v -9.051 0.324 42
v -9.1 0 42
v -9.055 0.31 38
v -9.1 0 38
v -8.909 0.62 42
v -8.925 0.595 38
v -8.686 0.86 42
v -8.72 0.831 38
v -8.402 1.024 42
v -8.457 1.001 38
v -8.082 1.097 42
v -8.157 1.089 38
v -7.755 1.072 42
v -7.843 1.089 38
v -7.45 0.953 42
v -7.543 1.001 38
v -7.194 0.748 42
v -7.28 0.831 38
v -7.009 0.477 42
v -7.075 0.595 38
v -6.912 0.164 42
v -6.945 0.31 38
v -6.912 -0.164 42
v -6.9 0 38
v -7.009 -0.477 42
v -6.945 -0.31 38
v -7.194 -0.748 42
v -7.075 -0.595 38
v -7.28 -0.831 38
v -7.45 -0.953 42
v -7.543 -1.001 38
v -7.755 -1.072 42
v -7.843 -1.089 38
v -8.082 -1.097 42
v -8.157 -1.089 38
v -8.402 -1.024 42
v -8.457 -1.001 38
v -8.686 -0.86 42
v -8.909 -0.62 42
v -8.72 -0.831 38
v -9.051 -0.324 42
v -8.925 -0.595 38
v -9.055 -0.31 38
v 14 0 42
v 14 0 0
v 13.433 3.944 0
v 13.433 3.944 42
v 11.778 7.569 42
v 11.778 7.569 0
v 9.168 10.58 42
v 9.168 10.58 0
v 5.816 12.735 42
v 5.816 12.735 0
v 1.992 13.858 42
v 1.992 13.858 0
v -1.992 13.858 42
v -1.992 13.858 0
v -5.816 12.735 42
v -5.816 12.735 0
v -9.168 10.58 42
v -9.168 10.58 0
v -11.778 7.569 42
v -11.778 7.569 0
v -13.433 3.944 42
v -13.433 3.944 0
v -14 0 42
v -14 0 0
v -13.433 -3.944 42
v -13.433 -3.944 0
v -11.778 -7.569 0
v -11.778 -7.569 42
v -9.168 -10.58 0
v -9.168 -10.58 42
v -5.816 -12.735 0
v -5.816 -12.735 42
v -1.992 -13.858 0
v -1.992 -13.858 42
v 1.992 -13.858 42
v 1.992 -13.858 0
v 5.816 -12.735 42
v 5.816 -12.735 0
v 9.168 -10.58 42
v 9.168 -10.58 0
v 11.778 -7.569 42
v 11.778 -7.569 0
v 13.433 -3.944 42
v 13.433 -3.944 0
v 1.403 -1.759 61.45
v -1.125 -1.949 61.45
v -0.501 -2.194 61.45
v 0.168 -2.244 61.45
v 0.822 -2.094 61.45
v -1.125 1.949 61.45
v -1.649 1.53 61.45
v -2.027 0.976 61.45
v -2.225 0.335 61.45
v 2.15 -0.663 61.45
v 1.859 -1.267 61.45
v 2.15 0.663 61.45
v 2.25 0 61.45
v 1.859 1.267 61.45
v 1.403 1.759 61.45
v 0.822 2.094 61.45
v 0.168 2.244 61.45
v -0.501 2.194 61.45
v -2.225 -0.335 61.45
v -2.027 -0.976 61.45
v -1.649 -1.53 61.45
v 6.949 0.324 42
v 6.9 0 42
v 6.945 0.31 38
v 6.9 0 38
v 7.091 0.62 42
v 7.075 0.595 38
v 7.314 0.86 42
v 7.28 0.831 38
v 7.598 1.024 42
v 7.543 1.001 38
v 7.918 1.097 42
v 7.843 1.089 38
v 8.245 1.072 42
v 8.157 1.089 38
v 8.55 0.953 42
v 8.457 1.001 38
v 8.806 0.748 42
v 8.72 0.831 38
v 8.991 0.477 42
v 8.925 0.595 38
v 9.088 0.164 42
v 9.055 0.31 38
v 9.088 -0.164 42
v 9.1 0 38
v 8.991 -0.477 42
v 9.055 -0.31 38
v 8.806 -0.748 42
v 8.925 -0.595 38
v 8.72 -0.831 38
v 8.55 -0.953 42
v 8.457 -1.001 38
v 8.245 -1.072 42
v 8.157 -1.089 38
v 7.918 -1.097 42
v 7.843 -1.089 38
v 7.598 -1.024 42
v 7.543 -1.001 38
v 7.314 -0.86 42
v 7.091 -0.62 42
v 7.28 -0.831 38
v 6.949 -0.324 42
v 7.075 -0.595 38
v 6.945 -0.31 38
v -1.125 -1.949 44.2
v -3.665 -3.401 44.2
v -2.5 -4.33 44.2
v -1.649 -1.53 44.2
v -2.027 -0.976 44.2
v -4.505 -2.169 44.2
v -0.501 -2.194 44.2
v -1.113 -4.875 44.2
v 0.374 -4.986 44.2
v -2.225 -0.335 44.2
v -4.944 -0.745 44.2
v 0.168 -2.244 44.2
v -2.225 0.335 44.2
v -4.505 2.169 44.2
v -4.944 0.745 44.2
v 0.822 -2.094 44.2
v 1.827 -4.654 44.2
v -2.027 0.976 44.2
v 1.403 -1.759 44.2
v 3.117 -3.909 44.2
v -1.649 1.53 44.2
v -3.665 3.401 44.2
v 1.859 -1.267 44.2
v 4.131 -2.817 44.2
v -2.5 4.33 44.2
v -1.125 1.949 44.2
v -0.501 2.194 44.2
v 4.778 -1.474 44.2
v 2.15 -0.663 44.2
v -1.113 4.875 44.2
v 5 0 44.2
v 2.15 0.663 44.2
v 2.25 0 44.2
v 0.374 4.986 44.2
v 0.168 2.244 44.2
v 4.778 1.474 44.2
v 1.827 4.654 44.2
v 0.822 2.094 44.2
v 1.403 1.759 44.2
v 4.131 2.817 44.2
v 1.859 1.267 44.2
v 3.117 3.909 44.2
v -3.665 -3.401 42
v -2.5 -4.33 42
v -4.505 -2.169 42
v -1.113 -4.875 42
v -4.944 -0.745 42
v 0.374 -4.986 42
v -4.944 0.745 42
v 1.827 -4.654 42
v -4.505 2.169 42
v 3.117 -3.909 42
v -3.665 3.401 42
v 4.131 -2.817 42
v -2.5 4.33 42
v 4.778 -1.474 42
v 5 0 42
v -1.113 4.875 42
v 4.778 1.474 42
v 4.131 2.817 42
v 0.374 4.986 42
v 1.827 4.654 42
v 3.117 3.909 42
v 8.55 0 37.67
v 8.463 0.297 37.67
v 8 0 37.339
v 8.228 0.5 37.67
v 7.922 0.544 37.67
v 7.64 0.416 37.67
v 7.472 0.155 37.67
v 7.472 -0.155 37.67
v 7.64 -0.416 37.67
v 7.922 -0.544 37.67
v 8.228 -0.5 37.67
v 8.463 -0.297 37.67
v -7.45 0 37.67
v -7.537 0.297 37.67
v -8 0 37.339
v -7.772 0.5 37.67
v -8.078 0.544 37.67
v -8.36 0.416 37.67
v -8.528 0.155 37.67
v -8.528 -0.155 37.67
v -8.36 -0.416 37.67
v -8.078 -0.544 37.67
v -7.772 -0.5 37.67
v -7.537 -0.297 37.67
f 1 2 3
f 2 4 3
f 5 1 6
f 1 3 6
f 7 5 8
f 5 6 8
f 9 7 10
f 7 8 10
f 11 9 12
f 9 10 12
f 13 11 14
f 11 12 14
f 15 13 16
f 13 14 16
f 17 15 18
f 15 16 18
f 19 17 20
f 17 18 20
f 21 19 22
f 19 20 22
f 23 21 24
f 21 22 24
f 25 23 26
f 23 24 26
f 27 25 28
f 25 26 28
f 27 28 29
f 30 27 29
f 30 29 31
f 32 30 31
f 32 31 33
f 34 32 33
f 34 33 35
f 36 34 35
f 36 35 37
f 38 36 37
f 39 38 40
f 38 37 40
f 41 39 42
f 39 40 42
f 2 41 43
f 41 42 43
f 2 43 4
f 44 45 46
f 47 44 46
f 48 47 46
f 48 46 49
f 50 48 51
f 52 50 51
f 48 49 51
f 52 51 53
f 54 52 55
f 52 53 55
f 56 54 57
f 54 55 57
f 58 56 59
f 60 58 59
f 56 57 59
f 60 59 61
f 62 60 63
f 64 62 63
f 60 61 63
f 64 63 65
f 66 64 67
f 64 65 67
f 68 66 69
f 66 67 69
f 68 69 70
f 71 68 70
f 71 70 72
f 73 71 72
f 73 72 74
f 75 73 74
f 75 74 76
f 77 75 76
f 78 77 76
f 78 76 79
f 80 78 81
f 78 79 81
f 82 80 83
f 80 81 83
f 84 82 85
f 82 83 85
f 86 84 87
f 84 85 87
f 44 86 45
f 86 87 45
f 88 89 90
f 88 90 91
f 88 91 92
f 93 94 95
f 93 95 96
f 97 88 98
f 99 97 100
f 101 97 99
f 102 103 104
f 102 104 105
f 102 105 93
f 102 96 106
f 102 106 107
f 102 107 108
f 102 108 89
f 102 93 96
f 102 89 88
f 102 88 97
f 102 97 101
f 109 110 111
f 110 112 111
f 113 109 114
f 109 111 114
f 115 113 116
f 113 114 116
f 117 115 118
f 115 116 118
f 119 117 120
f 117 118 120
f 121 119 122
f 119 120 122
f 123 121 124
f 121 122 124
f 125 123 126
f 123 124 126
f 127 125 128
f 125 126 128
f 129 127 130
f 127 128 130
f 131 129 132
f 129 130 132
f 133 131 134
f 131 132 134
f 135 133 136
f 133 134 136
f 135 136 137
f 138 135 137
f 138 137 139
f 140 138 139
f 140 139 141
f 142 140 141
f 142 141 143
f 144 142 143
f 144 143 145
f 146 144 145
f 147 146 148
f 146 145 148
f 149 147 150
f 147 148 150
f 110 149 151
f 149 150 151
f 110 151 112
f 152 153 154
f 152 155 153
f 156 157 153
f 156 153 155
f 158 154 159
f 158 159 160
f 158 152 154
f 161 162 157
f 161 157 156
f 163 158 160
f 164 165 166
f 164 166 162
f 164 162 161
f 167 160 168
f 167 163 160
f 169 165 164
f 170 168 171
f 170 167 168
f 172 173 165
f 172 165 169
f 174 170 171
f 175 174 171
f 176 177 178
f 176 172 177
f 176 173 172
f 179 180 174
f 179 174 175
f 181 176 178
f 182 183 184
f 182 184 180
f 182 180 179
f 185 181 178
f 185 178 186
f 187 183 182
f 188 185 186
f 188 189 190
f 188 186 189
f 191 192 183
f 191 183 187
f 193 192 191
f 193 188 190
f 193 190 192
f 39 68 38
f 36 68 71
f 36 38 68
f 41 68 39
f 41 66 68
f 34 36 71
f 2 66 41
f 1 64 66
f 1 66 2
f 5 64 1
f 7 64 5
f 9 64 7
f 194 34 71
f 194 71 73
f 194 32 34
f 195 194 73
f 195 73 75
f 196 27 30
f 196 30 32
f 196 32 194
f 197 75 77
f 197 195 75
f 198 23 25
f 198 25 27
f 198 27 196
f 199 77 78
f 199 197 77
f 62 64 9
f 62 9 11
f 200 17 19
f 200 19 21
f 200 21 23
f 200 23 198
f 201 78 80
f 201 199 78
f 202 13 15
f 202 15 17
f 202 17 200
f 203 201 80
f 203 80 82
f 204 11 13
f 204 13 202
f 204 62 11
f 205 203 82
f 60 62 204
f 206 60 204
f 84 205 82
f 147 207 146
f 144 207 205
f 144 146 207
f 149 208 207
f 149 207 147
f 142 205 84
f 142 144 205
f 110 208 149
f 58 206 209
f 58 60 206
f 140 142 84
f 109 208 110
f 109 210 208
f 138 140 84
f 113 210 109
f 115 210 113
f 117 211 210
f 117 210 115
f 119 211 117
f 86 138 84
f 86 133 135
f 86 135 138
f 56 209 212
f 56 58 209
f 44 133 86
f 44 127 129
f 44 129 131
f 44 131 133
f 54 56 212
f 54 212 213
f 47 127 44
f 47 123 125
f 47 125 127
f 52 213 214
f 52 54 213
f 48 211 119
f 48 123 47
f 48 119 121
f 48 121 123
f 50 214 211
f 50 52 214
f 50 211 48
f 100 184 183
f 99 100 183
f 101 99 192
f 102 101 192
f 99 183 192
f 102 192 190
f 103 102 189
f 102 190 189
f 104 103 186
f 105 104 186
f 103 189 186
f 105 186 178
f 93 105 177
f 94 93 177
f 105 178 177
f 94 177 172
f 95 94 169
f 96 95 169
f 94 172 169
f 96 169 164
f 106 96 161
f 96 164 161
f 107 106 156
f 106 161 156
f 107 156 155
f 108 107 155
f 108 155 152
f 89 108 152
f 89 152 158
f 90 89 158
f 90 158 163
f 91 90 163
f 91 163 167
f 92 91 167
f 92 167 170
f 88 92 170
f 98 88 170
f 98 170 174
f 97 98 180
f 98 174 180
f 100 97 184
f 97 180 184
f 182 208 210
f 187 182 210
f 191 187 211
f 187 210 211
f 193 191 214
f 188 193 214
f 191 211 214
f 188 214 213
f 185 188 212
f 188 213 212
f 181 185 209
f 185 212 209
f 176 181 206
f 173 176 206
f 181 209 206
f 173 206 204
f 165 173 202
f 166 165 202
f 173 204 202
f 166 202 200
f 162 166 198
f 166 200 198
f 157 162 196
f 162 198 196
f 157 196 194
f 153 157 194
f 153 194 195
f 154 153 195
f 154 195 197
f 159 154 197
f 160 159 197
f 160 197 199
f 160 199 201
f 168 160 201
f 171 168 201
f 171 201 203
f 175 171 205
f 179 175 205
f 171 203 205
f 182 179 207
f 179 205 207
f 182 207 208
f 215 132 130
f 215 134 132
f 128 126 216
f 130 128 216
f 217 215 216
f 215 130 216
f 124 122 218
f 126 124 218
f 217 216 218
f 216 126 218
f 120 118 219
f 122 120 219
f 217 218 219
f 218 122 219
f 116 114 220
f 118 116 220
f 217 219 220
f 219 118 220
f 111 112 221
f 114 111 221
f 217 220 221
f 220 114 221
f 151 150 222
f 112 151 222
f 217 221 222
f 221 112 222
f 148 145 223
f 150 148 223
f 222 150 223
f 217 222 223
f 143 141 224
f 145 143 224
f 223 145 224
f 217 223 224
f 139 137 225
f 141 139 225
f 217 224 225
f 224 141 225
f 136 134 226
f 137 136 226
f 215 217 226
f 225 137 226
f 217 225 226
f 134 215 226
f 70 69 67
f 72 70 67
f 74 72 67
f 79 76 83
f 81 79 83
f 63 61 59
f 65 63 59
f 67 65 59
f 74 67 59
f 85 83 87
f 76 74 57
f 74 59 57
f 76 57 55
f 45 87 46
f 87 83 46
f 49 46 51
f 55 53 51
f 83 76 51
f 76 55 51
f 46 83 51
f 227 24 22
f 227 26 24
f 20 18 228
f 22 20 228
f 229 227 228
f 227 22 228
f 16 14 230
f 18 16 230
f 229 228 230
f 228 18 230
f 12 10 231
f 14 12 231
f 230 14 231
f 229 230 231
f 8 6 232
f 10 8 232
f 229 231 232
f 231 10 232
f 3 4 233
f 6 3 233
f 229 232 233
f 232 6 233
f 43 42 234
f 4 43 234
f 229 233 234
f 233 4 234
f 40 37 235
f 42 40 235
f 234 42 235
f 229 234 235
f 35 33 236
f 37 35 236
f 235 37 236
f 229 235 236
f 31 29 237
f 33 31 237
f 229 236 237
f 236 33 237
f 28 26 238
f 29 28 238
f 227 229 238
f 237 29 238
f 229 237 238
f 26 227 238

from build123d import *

# Parameters (mm, degrees)
F0_R     = 14
F1_DEPTH = 42
F2_R     = 5
F3_DEPTH = 2.2
F4_R     = 2.25
F5_DEPTH = 17.25
F6_D     = 2.2
F6_DEPTH = 4
F6_TIP   = 0.6609466809


with BuildPart() as f1:
    # F0 (on Top) → F1 (new body)
    with BuildSketch(Plane.XY):
        Circle(F0_R)
    extrude(amount=F1_DEPTH)

    # F2 (on face) → F3 (join)
    with BuildSketch(Plane.XY.offset(42)):
        Circle(F2_R)
    extrude(amount=F3_DEPTH)

    # F4 (on face) → F5 (join)
    with BuildSketch(Plane.XY.offset(44.2)):
        Circle(F4_R)
    extrude(amount=F5_DEPTH)

    # F6
    with Locations(Plane.XY.offset(42)):
        with Locations((-8, 0), (8, 0)):
            Hole(F6_D / 2, depth=F6_DEPTH)
            with Locations((0, 0, -(F6_DEPTH + F6_TIP / 2))):  # 118° drill point
                Cone(0, F6_D / 2, F6_TIP, mode=Mode.SUBTRACT)


solid = f1.part
